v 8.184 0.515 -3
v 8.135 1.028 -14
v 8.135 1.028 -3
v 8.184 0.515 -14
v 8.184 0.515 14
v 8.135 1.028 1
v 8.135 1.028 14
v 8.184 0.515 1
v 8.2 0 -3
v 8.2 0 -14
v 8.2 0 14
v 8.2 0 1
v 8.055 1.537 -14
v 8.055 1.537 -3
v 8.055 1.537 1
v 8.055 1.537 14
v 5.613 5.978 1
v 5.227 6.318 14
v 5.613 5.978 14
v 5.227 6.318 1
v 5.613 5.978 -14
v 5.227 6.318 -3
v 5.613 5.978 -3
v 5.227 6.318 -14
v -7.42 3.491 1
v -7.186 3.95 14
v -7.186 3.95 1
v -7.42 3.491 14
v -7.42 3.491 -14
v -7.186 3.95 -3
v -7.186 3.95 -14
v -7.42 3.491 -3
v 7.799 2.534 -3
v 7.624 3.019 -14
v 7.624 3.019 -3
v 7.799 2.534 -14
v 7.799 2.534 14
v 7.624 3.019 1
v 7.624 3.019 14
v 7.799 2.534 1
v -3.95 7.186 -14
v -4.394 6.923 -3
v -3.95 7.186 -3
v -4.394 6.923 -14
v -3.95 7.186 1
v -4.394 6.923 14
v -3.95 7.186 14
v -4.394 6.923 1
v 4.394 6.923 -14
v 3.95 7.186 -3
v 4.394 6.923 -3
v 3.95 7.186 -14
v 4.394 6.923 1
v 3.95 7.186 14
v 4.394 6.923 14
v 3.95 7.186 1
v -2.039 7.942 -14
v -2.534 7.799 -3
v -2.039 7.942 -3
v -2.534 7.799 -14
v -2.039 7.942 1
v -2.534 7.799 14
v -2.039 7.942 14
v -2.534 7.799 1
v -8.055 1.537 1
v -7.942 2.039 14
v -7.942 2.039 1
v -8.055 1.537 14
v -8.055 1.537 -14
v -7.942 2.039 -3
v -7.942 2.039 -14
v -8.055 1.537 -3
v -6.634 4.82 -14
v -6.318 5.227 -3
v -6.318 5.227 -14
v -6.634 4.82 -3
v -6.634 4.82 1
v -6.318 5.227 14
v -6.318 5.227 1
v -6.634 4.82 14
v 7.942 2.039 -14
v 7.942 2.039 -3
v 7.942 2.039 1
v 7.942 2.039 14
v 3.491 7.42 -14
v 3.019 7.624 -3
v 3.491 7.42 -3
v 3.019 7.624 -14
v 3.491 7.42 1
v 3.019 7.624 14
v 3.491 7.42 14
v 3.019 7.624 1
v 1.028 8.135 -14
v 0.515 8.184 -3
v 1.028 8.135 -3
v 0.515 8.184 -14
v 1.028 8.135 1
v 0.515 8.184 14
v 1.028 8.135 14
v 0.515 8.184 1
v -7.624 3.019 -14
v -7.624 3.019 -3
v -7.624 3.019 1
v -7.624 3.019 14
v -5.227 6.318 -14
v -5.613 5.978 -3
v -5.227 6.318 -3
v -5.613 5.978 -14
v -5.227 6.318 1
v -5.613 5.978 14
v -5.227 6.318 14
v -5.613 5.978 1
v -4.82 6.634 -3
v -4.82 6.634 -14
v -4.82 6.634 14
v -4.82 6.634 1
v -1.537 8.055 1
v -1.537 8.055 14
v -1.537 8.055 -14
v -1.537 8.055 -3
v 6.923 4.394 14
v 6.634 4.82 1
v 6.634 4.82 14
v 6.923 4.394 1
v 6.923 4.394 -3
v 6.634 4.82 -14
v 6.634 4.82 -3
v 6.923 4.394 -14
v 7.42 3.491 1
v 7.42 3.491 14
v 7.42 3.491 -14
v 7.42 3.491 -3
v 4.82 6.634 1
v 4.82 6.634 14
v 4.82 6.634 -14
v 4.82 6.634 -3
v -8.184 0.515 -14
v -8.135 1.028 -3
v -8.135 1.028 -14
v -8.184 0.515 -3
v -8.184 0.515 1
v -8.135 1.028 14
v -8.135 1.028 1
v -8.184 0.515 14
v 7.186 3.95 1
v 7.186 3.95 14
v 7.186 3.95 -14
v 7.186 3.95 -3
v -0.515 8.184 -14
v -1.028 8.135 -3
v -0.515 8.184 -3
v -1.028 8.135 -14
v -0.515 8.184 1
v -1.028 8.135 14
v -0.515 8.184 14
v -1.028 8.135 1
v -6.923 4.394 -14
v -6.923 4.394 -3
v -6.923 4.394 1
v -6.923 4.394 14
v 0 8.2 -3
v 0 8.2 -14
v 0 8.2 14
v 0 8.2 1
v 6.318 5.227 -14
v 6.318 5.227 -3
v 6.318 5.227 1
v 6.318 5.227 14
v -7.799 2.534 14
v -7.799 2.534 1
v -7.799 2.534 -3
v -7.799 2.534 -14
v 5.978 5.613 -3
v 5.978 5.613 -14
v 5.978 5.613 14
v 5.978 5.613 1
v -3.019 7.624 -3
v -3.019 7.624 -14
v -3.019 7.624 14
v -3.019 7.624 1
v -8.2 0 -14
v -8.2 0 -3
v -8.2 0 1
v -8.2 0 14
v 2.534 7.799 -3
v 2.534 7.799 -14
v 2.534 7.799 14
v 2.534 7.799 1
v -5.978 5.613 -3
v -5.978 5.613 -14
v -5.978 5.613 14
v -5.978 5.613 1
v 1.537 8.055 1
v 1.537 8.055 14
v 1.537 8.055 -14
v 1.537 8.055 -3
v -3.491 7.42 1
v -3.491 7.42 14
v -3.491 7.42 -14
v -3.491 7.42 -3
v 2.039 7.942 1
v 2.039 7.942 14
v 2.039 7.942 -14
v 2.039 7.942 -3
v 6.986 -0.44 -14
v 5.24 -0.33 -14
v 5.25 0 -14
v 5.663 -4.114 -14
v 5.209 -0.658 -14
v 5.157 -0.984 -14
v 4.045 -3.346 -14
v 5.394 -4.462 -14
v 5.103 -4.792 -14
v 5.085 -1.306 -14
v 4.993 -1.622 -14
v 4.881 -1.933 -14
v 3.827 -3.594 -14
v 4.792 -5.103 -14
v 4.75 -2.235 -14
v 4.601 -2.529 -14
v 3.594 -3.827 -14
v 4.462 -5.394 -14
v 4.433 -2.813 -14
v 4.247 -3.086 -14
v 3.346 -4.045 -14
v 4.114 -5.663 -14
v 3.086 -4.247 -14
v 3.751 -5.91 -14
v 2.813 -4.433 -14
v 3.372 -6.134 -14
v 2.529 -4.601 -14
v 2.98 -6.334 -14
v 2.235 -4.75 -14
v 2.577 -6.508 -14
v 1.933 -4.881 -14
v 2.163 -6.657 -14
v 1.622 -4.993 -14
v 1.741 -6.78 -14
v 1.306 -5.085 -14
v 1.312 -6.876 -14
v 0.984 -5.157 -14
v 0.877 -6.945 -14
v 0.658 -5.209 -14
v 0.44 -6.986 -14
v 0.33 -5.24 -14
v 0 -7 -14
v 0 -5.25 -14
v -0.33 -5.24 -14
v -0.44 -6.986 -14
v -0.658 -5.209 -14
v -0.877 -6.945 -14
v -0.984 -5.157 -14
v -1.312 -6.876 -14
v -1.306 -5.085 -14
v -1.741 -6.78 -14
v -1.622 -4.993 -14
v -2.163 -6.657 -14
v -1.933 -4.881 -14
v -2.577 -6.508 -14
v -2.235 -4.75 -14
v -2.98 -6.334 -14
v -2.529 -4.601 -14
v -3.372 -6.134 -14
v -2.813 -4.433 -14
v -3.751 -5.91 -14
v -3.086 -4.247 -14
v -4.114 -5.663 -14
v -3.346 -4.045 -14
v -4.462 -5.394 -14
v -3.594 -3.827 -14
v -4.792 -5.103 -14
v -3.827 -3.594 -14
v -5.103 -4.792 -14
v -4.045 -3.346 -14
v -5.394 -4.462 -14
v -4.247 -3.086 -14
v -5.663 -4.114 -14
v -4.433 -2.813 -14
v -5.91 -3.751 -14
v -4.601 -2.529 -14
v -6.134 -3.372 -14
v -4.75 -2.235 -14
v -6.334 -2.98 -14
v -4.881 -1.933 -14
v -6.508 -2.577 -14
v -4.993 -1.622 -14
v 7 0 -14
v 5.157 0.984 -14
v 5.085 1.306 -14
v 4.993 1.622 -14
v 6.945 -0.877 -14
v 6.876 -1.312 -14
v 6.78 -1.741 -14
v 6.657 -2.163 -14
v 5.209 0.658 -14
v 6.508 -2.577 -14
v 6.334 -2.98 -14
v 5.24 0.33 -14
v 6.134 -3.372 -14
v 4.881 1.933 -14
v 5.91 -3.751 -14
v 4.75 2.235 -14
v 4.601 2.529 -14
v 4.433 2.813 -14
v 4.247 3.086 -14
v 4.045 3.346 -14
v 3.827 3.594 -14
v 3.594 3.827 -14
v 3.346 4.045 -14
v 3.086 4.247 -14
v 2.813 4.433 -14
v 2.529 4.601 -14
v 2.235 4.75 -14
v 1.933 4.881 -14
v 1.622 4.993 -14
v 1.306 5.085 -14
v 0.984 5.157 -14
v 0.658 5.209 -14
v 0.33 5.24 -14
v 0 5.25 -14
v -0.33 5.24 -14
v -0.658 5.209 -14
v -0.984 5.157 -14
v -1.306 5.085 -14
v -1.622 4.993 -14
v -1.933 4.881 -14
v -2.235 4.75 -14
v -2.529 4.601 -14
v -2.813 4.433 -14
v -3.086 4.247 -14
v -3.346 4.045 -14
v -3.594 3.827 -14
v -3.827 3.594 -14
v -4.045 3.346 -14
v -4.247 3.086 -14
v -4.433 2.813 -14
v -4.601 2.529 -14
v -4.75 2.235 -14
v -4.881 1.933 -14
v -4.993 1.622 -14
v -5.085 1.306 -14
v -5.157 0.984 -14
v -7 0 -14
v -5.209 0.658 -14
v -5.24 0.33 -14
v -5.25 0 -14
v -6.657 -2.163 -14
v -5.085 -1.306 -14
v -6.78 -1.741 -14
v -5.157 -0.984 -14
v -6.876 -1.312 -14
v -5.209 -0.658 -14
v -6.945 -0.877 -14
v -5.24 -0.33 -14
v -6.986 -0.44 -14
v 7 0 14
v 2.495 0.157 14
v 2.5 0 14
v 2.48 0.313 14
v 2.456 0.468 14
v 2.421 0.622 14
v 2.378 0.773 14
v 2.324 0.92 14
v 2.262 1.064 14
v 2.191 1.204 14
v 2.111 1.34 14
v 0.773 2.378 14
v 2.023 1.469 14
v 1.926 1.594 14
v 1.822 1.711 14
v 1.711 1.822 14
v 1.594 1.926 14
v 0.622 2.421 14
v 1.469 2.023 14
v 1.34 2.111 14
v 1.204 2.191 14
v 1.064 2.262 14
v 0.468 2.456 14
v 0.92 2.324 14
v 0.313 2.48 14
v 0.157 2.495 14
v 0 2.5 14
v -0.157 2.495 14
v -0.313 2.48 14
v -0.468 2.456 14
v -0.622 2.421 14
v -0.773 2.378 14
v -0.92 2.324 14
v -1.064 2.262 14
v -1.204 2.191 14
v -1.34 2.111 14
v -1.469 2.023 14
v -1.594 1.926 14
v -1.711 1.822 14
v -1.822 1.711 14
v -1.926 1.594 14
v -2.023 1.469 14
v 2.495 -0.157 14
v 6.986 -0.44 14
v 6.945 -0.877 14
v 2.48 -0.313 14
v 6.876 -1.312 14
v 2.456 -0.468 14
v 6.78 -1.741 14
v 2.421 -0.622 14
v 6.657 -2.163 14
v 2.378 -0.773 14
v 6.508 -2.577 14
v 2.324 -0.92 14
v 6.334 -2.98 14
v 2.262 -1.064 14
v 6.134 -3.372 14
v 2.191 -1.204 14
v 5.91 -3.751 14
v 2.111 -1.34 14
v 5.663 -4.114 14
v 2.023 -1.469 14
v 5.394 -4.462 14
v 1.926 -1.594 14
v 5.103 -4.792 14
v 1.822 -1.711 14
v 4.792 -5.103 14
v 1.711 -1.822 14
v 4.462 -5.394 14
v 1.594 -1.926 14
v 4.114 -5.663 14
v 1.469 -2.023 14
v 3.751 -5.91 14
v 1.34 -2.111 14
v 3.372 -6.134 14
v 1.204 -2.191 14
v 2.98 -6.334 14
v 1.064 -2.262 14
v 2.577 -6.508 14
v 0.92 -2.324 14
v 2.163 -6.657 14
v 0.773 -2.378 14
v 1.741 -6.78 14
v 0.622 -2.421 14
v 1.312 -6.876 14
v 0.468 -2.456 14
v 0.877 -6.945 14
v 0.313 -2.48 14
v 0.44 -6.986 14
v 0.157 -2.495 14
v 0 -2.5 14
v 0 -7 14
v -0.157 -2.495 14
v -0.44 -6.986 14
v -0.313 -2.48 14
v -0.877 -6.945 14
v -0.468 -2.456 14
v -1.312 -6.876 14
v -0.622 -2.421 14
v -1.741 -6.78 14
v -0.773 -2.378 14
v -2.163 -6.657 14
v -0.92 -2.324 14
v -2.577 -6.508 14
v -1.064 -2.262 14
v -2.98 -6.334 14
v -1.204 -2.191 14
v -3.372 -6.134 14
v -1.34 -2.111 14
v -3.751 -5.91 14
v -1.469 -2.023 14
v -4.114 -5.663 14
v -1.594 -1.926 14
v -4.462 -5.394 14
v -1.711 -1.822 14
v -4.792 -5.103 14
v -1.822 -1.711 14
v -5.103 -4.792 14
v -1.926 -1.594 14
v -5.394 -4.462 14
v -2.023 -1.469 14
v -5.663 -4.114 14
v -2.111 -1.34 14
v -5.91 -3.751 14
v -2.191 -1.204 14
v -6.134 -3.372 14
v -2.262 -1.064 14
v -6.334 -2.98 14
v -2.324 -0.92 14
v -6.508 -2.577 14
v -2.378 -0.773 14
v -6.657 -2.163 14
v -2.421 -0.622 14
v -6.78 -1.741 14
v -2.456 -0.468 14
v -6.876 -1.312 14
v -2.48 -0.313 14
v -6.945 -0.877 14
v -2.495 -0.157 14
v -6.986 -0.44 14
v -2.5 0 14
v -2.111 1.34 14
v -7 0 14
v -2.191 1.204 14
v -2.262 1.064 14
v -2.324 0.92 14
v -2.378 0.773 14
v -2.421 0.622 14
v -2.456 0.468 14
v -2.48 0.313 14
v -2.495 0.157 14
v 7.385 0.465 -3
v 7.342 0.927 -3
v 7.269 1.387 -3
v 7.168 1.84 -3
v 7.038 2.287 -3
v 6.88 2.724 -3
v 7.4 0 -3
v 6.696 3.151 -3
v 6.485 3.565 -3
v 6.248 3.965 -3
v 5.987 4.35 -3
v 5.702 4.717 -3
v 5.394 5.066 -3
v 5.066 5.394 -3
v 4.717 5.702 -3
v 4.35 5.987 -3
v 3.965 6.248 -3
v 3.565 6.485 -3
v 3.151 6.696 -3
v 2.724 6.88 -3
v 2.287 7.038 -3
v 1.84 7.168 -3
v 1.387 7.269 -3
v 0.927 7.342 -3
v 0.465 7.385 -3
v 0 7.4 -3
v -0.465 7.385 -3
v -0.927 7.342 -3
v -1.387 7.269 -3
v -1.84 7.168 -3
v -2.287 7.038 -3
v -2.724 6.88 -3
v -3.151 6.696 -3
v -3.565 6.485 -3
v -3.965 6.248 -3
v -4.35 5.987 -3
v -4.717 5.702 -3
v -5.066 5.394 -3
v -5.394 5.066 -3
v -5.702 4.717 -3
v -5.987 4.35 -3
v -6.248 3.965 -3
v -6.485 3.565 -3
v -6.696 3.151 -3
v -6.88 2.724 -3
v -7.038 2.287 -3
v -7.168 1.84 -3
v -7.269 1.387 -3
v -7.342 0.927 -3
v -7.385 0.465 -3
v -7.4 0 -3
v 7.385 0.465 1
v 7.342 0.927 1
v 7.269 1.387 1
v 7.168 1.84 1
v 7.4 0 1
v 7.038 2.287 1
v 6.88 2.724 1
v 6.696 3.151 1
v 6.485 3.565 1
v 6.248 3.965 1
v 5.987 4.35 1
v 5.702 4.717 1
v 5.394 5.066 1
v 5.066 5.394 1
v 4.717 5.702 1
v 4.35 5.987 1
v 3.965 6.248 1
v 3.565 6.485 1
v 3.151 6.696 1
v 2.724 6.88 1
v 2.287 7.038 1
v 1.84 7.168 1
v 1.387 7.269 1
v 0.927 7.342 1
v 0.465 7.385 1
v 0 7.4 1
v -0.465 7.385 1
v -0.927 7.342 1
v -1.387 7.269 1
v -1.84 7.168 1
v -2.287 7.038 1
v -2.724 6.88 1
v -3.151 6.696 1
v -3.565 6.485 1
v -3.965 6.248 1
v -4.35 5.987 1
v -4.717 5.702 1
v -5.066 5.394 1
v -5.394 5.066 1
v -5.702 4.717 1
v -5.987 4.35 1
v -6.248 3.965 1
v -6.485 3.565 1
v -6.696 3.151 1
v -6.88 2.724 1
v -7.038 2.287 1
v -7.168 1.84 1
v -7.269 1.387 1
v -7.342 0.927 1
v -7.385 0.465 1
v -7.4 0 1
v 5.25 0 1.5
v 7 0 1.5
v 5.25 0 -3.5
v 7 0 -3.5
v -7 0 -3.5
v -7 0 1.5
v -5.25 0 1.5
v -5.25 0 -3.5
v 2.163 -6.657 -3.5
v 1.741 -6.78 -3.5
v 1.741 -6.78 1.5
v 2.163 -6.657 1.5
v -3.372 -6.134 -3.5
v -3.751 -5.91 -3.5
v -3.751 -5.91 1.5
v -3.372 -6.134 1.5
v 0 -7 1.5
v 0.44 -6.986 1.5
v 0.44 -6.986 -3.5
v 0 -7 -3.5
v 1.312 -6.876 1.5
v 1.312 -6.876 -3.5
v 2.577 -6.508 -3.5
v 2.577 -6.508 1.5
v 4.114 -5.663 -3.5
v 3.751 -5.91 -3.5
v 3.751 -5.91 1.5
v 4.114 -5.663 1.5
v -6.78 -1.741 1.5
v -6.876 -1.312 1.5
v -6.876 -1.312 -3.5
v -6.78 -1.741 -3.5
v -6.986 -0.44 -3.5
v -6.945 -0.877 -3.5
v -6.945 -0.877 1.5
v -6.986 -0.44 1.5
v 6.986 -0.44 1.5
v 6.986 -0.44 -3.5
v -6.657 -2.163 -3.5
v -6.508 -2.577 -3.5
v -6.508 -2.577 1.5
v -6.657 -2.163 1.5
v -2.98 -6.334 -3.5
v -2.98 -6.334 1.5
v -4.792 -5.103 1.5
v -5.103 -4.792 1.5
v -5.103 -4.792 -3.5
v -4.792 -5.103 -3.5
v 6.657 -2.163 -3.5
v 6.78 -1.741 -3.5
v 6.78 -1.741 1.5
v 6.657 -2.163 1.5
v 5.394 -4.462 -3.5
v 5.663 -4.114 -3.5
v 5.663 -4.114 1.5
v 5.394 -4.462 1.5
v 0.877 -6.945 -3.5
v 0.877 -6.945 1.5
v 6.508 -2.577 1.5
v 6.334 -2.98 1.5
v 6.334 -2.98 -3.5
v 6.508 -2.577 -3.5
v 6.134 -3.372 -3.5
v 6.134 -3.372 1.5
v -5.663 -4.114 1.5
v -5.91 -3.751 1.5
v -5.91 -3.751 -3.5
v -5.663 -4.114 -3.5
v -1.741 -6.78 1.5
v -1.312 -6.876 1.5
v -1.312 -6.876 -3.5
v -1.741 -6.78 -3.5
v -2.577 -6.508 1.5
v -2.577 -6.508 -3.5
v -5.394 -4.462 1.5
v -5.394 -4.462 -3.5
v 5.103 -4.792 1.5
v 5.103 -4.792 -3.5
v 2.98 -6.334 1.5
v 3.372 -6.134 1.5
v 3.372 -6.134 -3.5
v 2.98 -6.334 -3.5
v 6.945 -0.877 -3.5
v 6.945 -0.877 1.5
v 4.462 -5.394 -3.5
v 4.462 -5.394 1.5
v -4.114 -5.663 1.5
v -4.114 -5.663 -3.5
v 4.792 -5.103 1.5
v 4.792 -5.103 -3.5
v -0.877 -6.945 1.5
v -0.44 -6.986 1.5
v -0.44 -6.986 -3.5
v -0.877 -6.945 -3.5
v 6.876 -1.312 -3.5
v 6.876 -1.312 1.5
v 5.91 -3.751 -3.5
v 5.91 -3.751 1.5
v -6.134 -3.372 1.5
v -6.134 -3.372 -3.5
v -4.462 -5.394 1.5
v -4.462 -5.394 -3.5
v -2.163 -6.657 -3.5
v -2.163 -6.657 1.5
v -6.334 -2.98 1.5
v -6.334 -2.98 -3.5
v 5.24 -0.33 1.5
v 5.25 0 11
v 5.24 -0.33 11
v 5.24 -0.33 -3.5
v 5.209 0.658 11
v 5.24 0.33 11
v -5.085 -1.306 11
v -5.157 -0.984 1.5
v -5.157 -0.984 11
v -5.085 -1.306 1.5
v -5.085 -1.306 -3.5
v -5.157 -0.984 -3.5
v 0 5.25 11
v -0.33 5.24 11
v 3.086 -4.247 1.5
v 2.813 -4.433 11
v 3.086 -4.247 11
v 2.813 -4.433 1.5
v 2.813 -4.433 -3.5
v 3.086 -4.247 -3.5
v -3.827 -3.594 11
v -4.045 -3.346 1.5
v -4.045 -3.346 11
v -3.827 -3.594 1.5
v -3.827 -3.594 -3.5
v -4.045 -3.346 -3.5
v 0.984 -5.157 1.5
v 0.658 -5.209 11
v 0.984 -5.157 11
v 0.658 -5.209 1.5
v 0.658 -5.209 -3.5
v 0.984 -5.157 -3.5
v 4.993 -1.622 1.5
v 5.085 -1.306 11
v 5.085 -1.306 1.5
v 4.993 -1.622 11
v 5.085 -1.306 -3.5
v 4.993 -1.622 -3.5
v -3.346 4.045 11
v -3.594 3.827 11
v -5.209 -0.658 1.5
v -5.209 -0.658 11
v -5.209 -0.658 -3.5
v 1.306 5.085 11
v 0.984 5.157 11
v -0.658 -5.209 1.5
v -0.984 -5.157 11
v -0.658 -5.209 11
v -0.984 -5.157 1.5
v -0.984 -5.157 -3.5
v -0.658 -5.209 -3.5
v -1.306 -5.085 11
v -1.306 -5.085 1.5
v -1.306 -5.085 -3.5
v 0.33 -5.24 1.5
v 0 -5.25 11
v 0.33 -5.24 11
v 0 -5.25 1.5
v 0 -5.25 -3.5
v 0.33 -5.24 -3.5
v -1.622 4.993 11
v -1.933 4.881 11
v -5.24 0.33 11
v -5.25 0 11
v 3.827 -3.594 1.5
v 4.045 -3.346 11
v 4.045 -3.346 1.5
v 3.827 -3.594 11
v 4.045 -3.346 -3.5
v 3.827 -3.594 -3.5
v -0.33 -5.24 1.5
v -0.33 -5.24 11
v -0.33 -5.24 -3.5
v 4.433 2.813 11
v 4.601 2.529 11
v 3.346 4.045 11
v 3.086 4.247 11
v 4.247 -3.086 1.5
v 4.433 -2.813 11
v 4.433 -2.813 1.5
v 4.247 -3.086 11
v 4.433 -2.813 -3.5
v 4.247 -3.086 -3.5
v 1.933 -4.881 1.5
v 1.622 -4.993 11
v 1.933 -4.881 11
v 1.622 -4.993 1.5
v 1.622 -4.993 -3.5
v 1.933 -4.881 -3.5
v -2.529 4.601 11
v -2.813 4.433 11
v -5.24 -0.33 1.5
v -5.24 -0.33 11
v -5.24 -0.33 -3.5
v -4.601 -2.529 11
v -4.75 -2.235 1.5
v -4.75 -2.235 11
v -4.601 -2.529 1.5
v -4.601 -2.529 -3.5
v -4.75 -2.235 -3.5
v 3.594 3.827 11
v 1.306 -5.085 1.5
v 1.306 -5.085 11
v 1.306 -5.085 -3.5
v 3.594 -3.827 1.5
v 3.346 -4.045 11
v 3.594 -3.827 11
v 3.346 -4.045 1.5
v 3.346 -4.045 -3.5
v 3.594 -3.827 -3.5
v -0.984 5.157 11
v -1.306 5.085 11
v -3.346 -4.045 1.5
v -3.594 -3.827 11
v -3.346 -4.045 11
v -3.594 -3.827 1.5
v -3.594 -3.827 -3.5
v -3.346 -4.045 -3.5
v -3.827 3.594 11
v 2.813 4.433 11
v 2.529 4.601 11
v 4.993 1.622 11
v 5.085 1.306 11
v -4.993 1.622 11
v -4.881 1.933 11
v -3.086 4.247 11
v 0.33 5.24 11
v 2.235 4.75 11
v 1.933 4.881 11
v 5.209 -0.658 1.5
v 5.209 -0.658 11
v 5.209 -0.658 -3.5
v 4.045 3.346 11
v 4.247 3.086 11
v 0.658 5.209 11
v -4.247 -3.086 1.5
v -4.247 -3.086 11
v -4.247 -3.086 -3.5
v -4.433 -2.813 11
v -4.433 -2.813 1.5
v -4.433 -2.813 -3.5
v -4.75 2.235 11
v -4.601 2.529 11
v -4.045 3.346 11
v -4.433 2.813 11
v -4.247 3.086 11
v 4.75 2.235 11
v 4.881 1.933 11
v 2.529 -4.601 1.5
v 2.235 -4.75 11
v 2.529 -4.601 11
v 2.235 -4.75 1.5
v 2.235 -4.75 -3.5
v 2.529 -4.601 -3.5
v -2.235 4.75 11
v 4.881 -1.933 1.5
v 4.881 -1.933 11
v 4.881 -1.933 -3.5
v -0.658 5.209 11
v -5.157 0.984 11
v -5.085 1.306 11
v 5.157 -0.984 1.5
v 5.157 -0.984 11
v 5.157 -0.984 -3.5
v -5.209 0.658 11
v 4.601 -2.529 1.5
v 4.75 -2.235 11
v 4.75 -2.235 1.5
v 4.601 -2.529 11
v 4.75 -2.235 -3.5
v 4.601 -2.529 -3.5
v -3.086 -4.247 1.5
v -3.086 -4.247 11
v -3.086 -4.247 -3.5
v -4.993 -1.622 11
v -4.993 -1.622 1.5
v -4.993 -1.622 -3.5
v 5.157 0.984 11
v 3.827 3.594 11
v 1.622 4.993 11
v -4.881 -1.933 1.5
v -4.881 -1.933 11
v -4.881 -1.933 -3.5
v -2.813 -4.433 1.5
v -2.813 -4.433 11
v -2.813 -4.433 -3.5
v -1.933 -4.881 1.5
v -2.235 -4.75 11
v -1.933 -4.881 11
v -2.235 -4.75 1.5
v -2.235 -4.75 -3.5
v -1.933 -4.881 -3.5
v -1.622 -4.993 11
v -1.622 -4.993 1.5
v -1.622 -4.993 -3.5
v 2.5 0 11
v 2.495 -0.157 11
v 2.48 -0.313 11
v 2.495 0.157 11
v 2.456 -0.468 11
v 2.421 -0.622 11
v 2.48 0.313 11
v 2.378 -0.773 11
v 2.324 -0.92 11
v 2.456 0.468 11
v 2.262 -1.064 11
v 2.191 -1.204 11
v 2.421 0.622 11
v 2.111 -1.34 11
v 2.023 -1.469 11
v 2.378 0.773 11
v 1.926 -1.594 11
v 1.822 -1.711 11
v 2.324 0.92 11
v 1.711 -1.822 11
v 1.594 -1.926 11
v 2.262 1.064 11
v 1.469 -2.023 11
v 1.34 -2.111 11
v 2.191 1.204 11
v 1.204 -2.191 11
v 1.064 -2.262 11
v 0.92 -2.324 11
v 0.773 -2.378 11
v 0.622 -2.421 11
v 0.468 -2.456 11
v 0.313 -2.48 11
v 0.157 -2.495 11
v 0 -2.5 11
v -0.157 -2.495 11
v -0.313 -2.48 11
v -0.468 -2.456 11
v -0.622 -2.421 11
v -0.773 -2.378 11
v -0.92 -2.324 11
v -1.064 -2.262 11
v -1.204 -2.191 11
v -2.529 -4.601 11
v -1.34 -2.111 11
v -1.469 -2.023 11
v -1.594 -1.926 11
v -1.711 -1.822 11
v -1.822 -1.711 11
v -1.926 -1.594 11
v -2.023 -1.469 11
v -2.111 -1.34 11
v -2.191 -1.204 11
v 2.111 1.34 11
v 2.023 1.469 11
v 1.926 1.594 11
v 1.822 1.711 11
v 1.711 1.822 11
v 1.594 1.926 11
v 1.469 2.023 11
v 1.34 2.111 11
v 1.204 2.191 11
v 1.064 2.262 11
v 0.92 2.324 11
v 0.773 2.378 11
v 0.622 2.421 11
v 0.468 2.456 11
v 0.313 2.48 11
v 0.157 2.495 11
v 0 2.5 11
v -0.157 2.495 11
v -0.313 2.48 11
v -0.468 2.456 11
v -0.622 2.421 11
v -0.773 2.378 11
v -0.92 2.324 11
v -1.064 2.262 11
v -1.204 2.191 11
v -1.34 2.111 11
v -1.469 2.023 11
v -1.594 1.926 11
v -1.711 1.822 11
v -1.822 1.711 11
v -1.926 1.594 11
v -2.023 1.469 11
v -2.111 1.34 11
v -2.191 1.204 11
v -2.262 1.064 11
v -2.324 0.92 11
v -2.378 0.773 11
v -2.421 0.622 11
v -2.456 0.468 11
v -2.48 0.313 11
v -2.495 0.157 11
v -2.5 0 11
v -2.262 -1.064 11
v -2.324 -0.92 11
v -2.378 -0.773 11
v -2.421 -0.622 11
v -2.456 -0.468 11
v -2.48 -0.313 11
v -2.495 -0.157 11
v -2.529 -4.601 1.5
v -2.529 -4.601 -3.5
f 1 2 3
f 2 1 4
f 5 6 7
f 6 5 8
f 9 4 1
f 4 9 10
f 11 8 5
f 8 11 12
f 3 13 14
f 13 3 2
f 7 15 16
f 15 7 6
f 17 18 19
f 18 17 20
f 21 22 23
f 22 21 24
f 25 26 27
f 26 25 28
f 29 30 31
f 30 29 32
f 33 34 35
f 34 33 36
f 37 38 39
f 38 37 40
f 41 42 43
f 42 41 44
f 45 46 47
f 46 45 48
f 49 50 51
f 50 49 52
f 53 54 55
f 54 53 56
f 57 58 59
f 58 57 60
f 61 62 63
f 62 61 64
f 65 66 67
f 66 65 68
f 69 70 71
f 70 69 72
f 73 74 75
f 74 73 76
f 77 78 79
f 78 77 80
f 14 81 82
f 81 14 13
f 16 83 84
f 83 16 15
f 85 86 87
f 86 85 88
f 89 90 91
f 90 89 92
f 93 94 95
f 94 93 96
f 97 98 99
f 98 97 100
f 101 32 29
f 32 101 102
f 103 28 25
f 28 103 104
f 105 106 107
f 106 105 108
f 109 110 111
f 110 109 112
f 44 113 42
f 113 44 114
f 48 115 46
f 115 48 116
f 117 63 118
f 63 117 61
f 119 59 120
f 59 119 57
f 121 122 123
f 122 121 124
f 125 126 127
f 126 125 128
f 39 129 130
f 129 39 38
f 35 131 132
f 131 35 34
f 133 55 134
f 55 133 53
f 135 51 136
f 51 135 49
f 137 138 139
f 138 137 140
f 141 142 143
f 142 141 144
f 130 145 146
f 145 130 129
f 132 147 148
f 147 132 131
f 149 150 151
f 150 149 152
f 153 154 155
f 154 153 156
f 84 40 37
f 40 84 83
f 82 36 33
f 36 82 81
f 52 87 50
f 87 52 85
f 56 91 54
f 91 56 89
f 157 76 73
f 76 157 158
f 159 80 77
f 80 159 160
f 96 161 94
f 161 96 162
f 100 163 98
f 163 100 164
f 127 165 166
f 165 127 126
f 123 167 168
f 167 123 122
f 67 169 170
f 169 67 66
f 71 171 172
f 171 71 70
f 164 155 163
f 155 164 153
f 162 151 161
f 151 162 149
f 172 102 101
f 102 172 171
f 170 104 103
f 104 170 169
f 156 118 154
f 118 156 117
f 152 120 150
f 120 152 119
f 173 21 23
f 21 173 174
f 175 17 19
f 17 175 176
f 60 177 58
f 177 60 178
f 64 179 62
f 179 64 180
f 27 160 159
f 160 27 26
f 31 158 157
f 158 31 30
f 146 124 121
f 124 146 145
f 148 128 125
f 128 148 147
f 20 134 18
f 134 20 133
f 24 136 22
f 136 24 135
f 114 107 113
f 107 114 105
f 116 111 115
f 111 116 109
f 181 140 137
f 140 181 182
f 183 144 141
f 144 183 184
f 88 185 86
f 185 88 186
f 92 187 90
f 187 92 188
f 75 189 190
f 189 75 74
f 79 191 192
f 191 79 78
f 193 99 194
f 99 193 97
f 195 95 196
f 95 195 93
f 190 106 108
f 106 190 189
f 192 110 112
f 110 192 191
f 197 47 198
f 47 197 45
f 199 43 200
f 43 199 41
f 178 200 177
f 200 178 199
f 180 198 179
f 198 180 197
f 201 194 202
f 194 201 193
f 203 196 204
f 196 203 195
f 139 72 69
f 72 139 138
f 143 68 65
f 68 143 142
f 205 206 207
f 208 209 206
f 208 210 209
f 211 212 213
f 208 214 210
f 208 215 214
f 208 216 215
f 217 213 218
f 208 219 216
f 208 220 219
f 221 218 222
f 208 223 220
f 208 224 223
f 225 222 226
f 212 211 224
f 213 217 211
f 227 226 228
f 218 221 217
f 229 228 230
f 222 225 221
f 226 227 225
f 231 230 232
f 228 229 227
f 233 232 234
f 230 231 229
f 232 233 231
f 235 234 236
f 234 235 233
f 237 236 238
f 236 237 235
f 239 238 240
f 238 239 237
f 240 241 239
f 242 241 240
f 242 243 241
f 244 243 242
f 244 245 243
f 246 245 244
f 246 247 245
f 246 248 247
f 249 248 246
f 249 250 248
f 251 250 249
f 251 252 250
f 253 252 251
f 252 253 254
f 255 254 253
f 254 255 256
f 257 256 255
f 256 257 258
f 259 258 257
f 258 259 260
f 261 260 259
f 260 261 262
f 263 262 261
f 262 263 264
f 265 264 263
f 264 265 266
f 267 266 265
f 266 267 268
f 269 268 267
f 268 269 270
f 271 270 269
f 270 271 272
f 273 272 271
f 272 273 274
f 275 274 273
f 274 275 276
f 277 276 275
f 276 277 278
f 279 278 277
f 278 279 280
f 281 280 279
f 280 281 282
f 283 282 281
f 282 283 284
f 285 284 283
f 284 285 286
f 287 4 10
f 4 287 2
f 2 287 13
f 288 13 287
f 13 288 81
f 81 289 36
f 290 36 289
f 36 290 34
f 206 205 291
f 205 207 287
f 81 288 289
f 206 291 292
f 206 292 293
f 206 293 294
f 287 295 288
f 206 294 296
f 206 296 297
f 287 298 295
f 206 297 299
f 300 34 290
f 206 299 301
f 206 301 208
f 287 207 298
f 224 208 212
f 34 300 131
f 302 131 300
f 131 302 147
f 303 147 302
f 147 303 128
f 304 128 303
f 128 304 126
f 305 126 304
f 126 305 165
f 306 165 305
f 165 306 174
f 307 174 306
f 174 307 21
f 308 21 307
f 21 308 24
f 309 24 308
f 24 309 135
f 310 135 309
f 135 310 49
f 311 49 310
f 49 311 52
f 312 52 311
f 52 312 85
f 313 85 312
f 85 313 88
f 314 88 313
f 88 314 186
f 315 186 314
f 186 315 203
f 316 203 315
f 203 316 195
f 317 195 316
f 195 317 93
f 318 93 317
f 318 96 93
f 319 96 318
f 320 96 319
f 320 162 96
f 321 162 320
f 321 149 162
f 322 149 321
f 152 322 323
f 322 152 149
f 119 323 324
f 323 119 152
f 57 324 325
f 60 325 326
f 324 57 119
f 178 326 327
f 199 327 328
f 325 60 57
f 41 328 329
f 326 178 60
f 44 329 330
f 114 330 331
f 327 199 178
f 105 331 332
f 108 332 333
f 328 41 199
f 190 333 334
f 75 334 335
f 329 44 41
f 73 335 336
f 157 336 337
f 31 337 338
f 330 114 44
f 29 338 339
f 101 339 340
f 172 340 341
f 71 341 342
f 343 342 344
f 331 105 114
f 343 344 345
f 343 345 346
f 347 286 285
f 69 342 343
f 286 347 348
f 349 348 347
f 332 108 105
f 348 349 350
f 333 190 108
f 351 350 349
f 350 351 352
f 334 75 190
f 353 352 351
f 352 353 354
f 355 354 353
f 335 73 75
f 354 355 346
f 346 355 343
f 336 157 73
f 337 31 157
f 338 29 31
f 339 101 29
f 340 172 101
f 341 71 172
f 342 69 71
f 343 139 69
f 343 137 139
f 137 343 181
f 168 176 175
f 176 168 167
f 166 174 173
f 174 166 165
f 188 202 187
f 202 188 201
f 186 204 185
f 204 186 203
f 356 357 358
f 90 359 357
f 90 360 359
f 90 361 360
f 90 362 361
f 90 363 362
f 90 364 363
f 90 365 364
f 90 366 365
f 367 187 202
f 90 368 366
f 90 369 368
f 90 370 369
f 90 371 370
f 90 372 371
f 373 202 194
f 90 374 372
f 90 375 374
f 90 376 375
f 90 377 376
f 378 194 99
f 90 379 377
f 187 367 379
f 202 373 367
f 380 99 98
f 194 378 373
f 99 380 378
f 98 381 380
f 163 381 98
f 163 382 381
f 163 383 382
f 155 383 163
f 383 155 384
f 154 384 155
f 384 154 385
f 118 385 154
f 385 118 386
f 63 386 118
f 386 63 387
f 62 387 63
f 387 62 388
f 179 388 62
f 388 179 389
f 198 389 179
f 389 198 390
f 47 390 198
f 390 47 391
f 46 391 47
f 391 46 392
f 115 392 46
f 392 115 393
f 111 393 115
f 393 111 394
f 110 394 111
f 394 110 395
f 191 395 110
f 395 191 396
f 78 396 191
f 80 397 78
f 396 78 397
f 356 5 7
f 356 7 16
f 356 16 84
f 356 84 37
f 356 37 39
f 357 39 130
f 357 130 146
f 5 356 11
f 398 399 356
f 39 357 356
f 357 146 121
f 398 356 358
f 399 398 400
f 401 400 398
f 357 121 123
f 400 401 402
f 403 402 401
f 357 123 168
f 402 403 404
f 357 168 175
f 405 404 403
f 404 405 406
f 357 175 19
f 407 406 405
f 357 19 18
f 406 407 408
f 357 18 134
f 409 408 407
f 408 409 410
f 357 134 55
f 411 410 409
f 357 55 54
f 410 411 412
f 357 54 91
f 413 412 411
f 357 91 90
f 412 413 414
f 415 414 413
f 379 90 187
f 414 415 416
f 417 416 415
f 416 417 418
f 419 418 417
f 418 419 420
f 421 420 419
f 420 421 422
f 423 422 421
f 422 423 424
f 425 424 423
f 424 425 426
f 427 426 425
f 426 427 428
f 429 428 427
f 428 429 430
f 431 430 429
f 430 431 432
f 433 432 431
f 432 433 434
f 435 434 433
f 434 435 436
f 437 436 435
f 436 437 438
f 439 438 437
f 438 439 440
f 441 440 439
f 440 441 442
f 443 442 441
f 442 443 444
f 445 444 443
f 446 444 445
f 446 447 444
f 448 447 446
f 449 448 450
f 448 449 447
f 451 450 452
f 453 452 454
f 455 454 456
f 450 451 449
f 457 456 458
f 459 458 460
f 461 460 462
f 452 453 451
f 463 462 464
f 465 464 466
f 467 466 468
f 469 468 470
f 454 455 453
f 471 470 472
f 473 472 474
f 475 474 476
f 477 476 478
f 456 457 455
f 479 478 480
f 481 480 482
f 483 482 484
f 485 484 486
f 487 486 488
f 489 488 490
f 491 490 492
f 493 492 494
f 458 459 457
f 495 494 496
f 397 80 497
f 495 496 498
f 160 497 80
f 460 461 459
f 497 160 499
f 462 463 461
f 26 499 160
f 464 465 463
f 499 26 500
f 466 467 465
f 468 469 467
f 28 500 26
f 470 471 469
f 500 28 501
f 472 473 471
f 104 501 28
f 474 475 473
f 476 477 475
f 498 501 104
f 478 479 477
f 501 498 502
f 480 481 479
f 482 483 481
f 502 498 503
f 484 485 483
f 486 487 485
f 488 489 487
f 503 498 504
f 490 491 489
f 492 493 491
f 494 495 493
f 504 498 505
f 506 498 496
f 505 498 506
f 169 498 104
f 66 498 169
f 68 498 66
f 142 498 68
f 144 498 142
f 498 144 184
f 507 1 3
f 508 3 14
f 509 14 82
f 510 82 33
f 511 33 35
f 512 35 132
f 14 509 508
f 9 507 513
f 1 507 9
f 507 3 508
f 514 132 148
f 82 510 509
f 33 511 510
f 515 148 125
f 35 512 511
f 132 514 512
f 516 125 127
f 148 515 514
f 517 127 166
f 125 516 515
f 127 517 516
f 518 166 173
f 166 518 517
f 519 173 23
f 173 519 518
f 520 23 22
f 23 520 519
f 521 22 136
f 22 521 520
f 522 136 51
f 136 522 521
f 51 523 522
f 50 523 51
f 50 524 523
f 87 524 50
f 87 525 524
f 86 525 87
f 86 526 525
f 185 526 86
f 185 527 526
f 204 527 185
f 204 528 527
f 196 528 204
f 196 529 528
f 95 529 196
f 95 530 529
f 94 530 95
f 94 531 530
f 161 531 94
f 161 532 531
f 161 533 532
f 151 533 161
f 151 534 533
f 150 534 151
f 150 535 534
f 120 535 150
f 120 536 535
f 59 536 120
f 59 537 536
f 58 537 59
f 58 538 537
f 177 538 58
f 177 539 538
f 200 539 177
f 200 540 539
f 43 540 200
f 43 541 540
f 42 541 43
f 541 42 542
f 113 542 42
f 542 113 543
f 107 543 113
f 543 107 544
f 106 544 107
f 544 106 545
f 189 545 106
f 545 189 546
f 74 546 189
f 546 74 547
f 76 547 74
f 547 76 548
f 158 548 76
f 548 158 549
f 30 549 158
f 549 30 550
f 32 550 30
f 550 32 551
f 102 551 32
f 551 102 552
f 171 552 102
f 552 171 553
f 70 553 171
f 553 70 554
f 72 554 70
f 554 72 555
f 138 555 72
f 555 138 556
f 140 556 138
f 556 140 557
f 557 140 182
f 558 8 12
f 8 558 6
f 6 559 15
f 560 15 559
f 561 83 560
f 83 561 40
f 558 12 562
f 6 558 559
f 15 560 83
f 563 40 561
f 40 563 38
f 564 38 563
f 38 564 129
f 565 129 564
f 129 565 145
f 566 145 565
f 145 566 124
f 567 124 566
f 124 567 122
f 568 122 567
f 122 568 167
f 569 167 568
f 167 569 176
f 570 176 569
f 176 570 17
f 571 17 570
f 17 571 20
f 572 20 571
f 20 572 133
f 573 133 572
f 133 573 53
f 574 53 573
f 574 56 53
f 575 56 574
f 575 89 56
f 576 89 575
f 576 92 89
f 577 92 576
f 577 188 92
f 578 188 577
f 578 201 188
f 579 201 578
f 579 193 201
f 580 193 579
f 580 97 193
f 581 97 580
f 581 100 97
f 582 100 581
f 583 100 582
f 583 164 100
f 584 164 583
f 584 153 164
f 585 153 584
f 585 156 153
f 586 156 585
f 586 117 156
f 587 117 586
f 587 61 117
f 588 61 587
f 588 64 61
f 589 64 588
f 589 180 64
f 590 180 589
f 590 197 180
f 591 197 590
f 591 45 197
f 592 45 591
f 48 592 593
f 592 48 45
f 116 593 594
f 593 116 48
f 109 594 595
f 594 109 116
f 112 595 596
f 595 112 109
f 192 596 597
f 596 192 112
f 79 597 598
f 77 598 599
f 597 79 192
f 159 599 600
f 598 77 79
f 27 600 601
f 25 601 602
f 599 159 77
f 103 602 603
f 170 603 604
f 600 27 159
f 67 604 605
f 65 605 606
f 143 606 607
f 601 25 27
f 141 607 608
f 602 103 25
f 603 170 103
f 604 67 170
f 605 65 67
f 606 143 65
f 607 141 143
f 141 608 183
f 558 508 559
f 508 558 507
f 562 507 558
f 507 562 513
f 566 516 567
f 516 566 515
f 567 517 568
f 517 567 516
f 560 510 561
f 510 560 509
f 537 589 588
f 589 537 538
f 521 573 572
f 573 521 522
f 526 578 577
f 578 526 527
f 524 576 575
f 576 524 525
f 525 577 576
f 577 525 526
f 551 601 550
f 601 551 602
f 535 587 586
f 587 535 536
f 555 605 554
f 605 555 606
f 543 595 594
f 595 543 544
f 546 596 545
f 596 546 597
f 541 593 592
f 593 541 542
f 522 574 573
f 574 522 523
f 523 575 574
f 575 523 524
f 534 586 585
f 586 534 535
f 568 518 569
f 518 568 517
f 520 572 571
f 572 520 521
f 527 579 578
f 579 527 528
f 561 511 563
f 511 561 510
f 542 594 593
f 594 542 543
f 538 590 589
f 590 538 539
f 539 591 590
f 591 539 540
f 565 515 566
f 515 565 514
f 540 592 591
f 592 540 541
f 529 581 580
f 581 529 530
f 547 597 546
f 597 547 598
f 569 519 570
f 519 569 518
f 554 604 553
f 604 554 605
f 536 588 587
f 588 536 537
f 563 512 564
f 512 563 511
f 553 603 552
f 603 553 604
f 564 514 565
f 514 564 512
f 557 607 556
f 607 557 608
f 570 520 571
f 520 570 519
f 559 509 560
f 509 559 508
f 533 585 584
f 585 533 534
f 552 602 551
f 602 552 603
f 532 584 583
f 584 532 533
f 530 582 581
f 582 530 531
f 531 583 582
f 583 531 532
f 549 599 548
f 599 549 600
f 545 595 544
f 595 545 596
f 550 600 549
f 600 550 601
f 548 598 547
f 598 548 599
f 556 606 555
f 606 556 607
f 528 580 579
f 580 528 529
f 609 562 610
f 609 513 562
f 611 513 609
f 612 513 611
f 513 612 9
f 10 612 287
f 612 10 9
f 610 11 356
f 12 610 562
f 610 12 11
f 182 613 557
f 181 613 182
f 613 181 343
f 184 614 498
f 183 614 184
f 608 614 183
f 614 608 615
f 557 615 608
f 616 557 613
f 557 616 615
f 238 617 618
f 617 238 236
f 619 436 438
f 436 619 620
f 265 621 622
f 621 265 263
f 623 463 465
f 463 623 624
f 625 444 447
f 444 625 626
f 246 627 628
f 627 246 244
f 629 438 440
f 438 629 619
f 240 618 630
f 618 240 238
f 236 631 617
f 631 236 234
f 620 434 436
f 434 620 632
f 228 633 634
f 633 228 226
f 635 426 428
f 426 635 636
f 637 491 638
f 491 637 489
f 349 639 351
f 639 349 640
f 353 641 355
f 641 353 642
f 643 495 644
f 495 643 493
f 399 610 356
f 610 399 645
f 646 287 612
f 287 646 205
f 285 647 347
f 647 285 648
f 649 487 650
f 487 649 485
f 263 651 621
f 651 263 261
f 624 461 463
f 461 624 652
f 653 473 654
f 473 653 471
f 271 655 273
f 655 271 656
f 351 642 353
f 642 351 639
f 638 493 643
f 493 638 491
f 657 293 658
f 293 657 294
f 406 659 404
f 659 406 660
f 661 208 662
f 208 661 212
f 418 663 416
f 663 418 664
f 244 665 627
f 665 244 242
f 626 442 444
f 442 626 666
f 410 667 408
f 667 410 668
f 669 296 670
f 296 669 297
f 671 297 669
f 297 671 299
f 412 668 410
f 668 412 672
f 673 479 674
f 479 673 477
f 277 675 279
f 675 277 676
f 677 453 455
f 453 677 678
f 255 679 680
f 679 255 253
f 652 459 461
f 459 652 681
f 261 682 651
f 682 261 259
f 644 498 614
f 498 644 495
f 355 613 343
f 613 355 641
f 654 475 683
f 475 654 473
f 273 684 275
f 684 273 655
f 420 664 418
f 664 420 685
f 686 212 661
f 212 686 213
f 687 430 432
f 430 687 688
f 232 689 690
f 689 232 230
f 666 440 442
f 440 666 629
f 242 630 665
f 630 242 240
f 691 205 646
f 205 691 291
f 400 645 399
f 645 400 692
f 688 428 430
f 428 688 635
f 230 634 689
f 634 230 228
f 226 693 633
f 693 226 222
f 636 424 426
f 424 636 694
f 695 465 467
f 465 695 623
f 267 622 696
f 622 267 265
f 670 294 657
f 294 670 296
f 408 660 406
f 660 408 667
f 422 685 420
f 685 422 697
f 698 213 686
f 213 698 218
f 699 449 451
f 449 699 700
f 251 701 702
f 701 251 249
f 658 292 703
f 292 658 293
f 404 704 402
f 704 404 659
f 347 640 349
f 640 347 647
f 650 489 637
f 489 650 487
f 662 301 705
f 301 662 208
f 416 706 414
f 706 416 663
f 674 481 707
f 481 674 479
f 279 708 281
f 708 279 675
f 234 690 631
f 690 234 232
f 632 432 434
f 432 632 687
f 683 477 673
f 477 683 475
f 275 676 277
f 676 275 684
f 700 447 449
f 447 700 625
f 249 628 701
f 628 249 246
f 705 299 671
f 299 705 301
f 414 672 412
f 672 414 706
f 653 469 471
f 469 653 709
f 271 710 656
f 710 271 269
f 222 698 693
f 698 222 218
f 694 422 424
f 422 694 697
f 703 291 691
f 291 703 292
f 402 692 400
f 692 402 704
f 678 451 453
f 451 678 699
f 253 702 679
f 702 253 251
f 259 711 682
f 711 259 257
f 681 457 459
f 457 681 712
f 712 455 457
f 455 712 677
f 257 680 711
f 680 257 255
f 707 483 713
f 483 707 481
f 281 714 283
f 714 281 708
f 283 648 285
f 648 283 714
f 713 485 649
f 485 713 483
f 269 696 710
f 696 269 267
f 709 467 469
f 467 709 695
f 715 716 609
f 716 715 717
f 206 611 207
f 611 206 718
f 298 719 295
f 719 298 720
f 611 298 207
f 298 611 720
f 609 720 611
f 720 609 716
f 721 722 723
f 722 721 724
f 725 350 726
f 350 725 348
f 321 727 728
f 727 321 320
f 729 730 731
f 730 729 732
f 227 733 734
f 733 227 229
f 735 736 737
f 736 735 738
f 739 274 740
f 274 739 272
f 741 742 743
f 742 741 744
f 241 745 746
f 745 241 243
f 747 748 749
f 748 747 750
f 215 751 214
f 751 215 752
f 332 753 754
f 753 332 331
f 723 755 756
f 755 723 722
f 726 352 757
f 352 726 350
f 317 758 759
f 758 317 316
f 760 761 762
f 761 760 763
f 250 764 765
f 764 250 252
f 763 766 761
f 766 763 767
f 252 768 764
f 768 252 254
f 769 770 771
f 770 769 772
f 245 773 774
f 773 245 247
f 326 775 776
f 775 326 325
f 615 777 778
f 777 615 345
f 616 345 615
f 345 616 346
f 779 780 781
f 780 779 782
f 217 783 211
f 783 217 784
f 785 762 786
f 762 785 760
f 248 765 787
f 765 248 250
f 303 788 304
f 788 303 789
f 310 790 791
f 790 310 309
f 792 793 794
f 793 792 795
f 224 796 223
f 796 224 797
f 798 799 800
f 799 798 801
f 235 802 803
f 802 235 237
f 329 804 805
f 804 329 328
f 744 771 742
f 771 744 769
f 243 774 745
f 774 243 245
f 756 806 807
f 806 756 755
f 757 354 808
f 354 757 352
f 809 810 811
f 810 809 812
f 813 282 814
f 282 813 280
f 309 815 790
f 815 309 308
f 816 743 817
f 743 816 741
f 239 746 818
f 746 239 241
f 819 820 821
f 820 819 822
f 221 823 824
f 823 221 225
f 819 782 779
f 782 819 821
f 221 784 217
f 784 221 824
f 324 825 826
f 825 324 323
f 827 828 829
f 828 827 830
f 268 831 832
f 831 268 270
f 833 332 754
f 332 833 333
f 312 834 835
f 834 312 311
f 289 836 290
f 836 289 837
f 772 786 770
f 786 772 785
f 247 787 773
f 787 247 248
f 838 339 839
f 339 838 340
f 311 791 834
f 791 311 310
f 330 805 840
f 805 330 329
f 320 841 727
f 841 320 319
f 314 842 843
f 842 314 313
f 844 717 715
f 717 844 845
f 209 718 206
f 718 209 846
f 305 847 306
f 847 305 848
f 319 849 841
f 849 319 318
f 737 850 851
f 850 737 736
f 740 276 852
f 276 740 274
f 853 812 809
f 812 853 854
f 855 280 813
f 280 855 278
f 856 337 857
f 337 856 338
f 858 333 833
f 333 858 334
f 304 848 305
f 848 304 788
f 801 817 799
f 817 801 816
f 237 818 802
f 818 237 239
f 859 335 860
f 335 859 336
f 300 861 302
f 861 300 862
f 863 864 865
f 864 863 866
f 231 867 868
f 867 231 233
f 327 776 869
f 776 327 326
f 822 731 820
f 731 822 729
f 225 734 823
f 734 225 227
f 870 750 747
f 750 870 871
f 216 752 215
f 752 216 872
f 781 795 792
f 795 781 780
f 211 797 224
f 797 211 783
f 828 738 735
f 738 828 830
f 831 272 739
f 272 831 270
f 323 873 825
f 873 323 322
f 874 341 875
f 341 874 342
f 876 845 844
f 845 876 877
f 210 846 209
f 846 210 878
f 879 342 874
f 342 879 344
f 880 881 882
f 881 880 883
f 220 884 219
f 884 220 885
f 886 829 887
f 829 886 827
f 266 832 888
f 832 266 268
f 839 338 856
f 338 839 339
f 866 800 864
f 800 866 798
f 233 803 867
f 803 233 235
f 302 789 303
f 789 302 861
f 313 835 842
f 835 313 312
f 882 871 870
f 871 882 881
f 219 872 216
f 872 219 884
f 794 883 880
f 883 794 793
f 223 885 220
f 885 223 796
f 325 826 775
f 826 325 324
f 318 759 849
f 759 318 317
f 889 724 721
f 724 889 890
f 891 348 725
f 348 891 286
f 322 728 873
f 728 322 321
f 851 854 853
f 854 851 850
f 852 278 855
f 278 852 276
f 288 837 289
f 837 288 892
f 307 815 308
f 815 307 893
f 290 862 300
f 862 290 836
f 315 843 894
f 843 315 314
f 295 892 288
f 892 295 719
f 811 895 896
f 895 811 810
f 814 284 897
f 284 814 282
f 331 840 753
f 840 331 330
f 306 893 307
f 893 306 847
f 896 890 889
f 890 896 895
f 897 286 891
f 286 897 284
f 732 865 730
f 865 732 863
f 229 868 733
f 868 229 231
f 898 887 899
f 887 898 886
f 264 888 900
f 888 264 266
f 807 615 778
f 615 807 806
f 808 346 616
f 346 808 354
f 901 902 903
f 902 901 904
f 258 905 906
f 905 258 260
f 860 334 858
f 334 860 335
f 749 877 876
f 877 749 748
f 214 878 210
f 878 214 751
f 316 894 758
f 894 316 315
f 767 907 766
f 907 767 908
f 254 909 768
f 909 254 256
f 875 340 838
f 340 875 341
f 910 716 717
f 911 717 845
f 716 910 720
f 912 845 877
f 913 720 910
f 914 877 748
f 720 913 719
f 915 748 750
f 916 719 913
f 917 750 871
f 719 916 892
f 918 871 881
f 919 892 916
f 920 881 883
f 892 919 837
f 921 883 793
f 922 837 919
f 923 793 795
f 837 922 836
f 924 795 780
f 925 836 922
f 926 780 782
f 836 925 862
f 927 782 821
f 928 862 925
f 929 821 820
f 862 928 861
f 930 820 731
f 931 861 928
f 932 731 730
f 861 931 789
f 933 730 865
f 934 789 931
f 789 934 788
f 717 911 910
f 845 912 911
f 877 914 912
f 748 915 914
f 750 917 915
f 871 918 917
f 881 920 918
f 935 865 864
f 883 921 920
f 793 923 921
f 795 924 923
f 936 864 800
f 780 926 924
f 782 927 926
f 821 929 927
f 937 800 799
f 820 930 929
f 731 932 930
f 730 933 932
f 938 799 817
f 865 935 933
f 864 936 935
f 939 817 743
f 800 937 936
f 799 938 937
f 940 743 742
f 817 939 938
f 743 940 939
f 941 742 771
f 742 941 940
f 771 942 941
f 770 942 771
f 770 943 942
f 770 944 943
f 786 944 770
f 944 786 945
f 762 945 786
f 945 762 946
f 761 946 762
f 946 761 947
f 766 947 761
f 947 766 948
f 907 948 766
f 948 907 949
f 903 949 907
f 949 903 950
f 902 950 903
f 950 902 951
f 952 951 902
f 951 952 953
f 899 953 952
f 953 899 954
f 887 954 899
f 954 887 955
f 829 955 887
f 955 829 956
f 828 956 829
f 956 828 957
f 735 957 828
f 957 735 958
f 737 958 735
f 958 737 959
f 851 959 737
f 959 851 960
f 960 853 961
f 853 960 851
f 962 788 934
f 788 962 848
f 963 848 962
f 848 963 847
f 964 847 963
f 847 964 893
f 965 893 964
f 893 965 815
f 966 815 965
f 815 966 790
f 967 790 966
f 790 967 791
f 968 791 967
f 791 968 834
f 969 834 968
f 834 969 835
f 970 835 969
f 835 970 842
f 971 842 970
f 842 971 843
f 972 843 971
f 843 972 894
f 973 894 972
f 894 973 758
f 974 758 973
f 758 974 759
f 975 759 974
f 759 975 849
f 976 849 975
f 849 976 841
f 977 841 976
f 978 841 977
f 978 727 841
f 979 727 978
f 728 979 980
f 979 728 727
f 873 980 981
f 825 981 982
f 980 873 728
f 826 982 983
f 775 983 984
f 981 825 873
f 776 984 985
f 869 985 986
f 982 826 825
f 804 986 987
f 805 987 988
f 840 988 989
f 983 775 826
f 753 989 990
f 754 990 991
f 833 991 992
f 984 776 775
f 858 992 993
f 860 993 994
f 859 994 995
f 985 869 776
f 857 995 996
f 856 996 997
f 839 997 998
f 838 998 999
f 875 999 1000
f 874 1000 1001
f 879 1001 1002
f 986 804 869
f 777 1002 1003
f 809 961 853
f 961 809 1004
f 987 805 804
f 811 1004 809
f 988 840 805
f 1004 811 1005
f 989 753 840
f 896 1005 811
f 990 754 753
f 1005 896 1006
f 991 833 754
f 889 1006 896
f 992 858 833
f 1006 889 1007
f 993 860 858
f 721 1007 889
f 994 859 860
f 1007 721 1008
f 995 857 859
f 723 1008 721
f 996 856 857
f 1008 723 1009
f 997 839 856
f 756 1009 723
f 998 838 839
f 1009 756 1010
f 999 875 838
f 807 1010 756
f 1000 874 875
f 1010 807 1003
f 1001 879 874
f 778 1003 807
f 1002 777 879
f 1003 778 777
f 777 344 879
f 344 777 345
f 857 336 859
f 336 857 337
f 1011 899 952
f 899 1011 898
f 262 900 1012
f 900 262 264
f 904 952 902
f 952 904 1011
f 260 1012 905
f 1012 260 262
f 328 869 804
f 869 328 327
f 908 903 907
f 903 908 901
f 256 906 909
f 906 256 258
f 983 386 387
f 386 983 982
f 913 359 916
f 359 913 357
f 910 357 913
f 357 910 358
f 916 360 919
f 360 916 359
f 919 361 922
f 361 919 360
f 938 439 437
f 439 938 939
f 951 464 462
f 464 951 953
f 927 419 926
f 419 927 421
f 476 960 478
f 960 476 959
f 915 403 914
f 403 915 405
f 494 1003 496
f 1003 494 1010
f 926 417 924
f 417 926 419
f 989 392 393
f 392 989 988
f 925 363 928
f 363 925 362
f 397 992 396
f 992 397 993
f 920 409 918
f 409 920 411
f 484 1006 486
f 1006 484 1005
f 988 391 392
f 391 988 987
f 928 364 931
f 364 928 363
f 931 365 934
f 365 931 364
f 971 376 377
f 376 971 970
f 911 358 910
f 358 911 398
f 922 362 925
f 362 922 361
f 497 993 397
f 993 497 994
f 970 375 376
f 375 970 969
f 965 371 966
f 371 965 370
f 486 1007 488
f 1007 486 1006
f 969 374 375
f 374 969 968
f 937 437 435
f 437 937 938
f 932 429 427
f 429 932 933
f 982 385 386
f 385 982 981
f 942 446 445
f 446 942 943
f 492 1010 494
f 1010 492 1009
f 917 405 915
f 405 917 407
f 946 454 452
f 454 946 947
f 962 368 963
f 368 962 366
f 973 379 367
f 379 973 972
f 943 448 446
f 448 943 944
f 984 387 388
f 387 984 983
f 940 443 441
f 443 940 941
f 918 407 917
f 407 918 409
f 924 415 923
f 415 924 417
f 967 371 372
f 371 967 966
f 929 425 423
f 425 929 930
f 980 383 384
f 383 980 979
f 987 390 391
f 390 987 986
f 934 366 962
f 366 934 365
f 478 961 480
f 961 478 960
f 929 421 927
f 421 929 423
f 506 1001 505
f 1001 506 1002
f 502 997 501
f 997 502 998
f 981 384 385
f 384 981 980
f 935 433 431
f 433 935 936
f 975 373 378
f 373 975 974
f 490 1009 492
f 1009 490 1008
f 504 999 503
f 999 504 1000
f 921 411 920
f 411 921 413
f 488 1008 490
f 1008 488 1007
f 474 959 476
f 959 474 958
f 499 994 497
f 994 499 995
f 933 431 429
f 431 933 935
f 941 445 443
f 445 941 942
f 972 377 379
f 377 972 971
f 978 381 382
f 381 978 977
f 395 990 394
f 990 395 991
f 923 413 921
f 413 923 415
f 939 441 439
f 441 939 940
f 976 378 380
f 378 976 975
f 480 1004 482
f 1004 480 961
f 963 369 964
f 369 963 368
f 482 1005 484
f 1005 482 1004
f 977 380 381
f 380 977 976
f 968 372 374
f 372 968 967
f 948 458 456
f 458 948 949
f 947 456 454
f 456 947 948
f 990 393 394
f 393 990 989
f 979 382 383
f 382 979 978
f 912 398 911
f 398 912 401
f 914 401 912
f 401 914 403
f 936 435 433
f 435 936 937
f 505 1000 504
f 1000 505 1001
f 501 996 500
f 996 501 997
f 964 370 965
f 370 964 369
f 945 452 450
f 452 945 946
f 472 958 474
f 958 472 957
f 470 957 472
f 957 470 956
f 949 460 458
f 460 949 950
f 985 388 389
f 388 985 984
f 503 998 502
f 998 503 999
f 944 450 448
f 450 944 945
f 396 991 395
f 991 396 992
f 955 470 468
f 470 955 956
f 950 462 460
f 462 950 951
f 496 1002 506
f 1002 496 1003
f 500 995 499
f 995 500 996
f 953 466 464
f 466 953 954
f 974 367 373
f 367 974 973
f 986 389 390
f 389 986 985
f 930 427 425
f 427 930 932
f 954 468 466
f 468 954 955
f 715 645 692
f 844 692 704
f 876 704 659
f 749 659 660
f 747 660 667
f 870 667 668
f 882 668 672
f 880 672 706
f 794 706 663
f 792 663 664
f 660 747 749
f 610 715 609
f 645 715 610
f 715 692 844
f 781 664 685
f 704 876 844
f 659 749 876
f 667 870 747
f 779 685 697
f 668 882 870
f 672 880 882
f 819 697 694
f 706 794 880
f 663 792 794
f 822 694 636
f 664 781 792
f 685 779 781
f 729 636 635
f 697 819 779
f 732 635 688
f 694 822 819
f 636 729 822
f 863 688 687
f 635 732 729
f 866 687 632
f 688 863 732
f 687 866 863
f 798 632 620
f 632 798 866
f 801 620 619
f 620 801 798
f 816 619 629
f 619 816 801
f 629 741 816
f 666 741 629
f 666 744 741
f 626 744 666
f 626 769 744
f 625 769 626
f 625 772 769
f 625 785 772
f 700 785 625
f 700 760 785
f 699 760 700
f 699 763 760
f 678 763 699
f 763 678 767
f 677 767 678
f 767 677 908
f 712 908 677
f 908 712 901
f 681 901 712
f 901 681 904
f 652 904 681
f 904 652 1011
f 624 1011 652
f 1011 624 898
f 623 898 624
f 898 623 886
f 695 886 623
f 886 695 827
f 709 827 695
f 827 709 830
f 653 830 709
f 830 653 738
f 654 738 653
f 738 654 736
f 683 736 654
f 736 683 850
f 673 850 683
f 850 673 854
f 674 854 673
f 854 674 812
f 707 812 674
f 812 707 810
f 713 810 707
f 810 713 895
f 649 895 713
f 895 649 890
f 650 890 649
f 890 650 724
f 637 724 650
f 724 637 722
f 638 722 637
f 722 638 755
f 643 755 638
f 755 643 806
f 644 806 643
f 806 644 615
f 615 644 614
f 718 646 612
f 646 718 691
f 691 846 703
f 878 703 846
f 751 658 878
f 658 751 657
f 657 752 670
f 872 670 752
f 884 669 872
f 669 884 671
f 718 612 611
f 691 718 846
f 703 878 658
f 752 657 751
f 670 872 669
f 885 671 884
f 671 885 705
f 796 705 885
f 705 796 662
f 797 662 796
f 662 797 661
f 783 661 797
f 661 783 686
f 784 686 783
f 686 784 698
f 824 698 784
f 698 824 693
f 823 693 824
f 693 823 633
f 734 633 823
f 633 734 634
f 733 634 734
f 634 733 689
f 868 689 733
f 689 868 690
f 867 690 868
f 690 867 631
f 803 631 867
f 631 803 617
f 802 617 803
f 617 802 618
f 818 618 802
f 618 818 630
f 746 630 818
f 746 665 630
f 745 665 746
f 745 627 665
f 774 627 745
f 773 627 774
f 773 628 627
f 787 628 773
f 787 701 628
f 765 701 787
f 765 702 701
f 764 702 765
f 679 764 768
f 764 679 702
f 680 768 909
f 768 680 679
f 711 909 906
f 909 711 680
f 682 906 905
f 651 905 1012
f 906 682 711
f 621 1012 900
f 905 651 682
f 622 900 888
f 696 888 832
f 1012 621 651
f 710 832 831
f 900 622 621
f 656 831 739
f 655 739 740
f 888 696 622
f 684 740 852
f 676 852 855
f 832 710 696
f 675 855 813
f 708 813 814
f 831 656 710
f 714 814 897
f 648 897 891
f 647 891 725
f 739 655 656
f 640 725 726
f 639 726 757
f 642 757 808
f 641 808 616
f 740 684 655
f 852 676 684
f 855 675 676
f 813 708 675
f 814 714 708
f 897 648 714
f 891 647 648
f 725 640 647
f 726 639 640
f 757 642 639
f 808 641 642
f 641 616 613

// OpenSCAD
// part resolution
$fn=100;
// total height of the part
$totalHeight = 28;
// height of the spring clip gap in the middle of the part
$clipGapHeight = 5;
// height of the retaining notch for the spring clip on the outer tube
$clipRetainHeight = 4;
// the depth or cut into the outer tube to hold the retaining clip 
$clipRetainDepth = 1.6;
// height of the end cap of the inner tube
$endCapHeight = 3;
// diameter of the screw hole in the end cap
$screwDiam = 5;
// diameter of the outer tube
$outerDiam = 16.4;
// diameter of the inner tube
$innerDiam = 14;
// wall thickness of the inner tube
$tubeTickness = 3.5;



// create the outer tube
difference()
{
  difference()
  {
    // create tube
    difference()
    {
      // outer cylinder
      cylinder(h=$totalHeight, d=$outerDiam, center=true);
      // inner cylinder cut out
      cylinder(h = $totalHeight + 1, d = $innerDiam, center = true);
    }
    translate([0,0,-1])
    {
      // cut out the clip retaining notch
      difference()
      {
        cylinder(h=$clipRetainHeight, d=$outerDiam+1, center=true);
        cylinder(h=$clipRetainHeight+1, d=$outerDiam-$clipRetainDepth, center=true);
      }
    }
  }
  // cut tube in half
  translate([0, -($outerDiam / 2) / 2, 0])
  {
    cube([$outerDiam, $outerDiam / 2, $totalHeight + 1], center=true);
  }
}

// create the inner tube with end cap, screw hole and spring clip notch
difference()
{
  difference()
  {
    // create inner tube with end cap
    difference()
    {
      cylinder(h = $totalHeight, d = $innerDiam, center = true);
      // leaving the end cap
      translate([0, 0, -$endCapHeight])
      {
        // cut out to make the tube
        cylinder(h = $totalHeight, d = ($innerDiam-$tubeTickness), center = true);
      }
    }
    // cut out the screw hole
    cylinder(h = $totalHeight + 1, d = $screwDiam, center = true);
  }

  // add the spring clip notch
  translate([0, -($outerDiam / 2) / 2, -1])
  {
    cube([$outerDiam, $outerDiam / 2, $clipGapHeight], center=true);
  }
}
